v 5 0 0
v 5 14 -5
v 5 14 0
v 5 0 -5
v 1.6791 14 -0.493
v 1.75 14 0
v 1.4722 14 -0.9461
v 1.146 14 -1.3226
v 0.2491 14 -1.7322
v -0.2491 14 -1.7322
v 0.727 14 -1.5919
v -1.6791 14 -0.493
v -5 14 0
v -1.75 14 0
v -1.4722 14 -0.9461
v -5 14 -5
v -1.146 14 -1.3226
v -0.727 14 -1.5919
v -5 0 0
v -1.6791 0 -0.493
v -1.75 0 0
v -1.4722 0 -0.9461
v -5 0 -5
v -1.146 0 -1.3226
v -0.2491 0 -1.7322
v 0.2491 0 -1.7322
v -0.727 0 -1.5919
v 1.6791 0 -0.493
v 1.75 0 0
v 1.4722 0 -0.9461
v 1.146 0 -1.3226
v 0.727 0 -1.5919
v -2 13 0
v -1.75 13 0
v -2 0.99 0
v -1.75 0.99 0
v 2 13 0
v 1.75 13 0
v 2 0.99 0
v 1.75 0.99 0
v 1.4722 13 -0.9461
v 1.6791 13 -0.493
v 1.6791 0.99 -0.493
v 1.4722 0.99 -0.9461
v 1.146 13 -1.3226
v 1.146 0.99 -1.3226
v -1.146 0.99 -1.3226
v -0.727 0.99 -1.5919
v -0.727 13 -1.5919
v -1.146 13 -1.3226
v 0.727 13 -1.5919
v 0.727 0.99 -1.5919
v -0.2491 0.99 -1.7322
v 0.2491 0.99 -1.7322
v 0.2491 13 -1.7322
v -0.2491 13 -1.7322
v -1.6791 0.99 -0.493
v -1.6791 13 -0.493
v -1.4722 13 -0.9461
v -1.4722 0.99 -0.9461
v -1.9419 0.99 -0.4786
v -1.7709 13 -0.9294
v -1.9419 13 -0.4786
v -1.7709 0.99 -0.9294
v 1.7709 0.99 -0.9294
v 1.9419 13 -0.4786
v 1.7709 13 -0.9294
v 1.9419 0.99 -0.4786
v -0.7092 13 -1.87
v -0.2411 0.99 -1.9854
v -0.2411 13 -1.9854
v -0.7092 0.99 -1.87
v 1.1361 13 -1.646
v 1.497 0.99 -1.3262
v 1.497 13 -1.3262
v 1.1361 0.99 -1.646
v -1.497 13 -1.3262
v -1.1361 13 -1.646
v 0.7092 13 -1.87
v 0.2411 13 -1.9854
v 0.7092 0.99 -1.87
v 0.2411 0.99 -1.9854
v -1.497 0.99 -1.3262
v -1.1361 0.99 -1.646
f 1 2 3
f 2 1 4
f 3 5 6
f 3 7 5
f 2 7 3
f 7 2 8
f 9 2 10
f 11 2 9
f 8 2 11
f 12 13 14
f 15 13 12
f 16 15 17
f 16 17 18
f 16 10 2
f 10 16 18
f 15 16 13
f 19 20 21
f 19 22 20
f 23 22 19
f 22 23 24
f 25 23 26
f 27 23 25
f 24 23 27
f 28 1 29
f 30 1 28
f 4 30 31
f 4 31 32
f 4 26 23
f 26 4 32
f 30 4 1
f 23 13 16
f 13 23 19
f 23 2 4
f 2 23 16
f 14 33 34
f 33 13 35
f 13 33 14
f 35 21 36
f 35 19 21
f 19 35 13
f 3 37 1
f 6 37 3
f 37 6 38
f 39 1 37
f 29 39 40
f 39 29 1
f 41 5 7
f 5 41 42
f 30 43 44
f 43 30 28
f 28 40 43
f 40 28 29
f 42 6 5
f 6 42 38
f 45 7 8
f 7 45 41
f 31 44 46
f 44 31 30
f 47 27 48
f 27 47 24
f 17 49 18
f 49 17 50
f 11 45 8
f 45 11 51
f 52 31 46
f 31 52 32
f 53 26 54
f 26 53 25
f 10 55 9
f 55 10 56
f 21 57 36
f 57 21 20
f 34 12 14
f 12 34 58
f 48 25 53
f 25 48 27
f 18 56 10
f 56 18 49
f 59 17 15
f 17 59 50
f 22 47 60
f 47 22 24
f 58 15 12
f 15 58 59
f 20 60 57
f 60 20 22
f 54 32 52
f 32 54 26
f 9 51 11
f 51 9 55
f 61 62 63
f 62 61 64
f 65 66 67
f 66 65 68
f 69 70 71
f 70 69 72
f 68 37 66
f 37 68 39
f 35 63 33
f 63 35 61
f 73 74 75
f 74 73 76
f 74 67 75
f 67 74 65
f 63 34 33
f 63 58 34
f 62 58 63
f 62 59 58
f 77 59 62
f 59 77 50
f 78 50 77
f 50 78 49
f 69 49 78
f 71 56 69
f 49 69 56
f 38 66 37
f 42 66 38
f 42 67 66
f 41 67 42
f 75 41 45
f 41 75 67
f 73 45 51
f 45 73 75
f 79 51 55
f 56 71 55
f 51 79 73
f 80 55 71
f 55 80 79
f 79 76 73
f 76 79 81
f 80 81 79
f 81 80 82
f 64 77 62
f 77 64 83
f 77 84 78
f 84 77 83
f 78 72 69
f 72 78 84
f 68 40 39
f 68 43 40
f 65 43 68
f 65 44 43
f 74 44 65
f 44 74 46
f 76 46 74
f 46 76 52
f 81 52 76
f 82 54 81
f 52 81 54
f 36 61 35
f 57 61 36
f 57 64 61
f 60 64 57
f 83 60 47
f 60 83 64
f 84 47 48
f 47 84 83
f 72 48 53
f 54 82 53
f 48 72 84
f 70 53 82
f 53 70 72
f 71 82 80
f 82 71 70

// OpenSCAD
// file: rgb_strip_to_fiber.scad
leds_per_meter = 60;
led_size = 5;
led_strip_width = 10;
led_strip_thickness = 2;

ferrule_dia = 6;
ferrule_depth = 12;
ferrule_insulation_dia = 10;
ferrule_insulation_height = 10;
ferrule_lip = [0.5, 1]; // ferrule wall thickness is 0.2

registration_block_size = [10, 10, 14];
registration_block_lip = 2;
led_register_lip = 4;
block_to_led = 5;

part_spacing = 0.2;
wall_thickness = 1.5;

m3_hole_size = 3.3;

$fa=0.5;
$fs=0.5;


/////// computed
led_stride = 1000/leds_per_meter;


smidge = 0.01;

module mockup(count, explode=0, half=0) {
  translate([0, explode * 10, 0])
    strip_base(count);
  if (!half)
    translate([0, explode * -10, 0])
      mirror([0, 1, 0])
        strip_base(count);

  translate([0, 0, -block_to_led])
    led_strip(count);
      translate([0 * led_stride, 0, 0])
        for (x = [0, half ? 0 : 1])
          rotate([0, 0, 90 + 180 * x])
            translate([0, max(0, explode * 5 - 2.5), 0])
              registration_block_awg_10(registration_block_size);

      translate([1 * led_stride, 0, 0])
        for (x = [0, half ? 0 : 1])
          rotate([0, 0, 90 + 180 * x])
            translate([0, max(0, explode * 5 - 2.5), 0])
              registration_block_awg_12(registration_block_size);

      translate([2 * led_stride, 0, 0])
        for (x = [0, half ? 0 : 1])
          rotate([0, 0, 90 + 180 * x])
            translate([0, max(0, explode * 5 - 2.5), 0])
              registration_block_awg_14(registration_block_size);
}

module strip_base(count) {
  registration_block_cutout = [registration_block_size.y + part_spacing,
                               registration_block_size.x + part_spacing,
                               registration_block_size.z + part_spacing];
  side_inset = 10;
  led_strip_cutout = led_strip_width + 1;

  housing_size = [(count -1) * led_stride + registration_block_cutout.x + wall_thickness * 2,
                  registration_block_cutout.y/2 + wall_thickness,
                  registration_block_cutout.z + wall_thickness * 2 + block_to_led];

  led_cutout = 5.5;
  fiber_cutout = registration_block_size.x - registration_block_lip;

  difference() {
    translate([-registration_block_cutout.x/2 - wall_thickness, 0, -wall_thickness - block_to_led])
      cube(housing_size);

    for (i = [0 : count - 1])
      translate([i * led_stride, 0, 0]) {
        registration_block_base(registration_block_cutout);
        translate([-led_cutout/2,-led_cutout/2, -block_to_led + smidge])
          cube([led_cutout, led_cutout, block_to_led]);
        translate([-fiber_cutout/2,-fiber_cutout/2, registration_block_cutout.z - smidge])
          cube([fiber_cutout, fiber_cutout, wall_thickness + smidge * 2]);
      }

    translate([-registration_block_cutout.x/2 - wall_thickness - smidge,
               -led_strip_cutout/2,
               -block_to_led -0])
      cube([housing_size.x + smidge * 2, led_strip_cutout, led_strip_thickness]);

    for (i = [0 : count - 2])
      translate([i * led_stride + led_stride/2, -smidge, registration_block_cutout.z/2]) {
        rotate([-90, 0, 0])
        cylinder(d=m3_hole_size, h=housing_size.y + smidge * 2);
      }

  }
}


// max 1 1mm fibers
module registration_block_awg_18(block_size=registration_block_size) {
  registration_block(block_size, 2.5, 8);
}

// max 3 1mm fibers
module registration_block_awg_14(block_size=registration_block_size) {
  registration_block(block_size, 3.4, 12);
}

// max 5 1mm fibers
module registration_block_awg_12(block_size=registration_block_size) {
  registration_block(block_size, 4, 12);
}

// max 7 1mm fibers
module registration_block_awg_10(block_size=registration_block_size) {
  registration_block(block_size, 4.7, 12);
}

module registration_block(block_size, ferrule_dia, ferrule_length) {
  difference() {
    intersection() {
      registration_block_base(block_size);
      translate([-block_size.x/2, 0])
        cube(block_size);
    }

    translate([0, 0, -smidge]) {
      cylinder(d=ferrule_dia - ferrule_lip.x, h=block_size.z + smidge * 2);
      translate([0, 0, ferrule_lip.y])
        cylinder(d=ferrule_dia, h=ferrule_length + smidge);
    }
  }
}

module registration_block_base(size) {
  translate([-size.x/2, -size.y/2])
    cube(size);
}

module ferrule_insulated() {
  taper_height = 2;

  translate([0, 0, -ferrule_depth])
    cylinder(d=ferrule_dia, h=ferrule_depth);

  translate([0, 0, taper_height])
    cylinder(d=ferrule_insulation_dia, h=ferrule_insulation_height-taper_height);
  cylinder(d1=ferrule_dia, d2=ferrule_insulation_dia, h=taper_height);

}

module led_strip(count) {
  translate([0, 0, 1]) {
  color("#fefefe")
  for (i = [0 : count - 1])
    translate([i * led_stride, 0, 0]) {
      translate([-led_size/2, -led_size/2, 0])
        cube([led_size, led_size, 2]);
    }

  color("#fcfcfc")
  translate([-led_stride/2, -led_strip_width/2, -1])
  cube([led_stride * count, led_strip_width, 1]);
  }
}
// main file
use <rgb_strip_to_fiber.scad>

rotate([-90, 0, 0])
  registration_block_awg_12();
